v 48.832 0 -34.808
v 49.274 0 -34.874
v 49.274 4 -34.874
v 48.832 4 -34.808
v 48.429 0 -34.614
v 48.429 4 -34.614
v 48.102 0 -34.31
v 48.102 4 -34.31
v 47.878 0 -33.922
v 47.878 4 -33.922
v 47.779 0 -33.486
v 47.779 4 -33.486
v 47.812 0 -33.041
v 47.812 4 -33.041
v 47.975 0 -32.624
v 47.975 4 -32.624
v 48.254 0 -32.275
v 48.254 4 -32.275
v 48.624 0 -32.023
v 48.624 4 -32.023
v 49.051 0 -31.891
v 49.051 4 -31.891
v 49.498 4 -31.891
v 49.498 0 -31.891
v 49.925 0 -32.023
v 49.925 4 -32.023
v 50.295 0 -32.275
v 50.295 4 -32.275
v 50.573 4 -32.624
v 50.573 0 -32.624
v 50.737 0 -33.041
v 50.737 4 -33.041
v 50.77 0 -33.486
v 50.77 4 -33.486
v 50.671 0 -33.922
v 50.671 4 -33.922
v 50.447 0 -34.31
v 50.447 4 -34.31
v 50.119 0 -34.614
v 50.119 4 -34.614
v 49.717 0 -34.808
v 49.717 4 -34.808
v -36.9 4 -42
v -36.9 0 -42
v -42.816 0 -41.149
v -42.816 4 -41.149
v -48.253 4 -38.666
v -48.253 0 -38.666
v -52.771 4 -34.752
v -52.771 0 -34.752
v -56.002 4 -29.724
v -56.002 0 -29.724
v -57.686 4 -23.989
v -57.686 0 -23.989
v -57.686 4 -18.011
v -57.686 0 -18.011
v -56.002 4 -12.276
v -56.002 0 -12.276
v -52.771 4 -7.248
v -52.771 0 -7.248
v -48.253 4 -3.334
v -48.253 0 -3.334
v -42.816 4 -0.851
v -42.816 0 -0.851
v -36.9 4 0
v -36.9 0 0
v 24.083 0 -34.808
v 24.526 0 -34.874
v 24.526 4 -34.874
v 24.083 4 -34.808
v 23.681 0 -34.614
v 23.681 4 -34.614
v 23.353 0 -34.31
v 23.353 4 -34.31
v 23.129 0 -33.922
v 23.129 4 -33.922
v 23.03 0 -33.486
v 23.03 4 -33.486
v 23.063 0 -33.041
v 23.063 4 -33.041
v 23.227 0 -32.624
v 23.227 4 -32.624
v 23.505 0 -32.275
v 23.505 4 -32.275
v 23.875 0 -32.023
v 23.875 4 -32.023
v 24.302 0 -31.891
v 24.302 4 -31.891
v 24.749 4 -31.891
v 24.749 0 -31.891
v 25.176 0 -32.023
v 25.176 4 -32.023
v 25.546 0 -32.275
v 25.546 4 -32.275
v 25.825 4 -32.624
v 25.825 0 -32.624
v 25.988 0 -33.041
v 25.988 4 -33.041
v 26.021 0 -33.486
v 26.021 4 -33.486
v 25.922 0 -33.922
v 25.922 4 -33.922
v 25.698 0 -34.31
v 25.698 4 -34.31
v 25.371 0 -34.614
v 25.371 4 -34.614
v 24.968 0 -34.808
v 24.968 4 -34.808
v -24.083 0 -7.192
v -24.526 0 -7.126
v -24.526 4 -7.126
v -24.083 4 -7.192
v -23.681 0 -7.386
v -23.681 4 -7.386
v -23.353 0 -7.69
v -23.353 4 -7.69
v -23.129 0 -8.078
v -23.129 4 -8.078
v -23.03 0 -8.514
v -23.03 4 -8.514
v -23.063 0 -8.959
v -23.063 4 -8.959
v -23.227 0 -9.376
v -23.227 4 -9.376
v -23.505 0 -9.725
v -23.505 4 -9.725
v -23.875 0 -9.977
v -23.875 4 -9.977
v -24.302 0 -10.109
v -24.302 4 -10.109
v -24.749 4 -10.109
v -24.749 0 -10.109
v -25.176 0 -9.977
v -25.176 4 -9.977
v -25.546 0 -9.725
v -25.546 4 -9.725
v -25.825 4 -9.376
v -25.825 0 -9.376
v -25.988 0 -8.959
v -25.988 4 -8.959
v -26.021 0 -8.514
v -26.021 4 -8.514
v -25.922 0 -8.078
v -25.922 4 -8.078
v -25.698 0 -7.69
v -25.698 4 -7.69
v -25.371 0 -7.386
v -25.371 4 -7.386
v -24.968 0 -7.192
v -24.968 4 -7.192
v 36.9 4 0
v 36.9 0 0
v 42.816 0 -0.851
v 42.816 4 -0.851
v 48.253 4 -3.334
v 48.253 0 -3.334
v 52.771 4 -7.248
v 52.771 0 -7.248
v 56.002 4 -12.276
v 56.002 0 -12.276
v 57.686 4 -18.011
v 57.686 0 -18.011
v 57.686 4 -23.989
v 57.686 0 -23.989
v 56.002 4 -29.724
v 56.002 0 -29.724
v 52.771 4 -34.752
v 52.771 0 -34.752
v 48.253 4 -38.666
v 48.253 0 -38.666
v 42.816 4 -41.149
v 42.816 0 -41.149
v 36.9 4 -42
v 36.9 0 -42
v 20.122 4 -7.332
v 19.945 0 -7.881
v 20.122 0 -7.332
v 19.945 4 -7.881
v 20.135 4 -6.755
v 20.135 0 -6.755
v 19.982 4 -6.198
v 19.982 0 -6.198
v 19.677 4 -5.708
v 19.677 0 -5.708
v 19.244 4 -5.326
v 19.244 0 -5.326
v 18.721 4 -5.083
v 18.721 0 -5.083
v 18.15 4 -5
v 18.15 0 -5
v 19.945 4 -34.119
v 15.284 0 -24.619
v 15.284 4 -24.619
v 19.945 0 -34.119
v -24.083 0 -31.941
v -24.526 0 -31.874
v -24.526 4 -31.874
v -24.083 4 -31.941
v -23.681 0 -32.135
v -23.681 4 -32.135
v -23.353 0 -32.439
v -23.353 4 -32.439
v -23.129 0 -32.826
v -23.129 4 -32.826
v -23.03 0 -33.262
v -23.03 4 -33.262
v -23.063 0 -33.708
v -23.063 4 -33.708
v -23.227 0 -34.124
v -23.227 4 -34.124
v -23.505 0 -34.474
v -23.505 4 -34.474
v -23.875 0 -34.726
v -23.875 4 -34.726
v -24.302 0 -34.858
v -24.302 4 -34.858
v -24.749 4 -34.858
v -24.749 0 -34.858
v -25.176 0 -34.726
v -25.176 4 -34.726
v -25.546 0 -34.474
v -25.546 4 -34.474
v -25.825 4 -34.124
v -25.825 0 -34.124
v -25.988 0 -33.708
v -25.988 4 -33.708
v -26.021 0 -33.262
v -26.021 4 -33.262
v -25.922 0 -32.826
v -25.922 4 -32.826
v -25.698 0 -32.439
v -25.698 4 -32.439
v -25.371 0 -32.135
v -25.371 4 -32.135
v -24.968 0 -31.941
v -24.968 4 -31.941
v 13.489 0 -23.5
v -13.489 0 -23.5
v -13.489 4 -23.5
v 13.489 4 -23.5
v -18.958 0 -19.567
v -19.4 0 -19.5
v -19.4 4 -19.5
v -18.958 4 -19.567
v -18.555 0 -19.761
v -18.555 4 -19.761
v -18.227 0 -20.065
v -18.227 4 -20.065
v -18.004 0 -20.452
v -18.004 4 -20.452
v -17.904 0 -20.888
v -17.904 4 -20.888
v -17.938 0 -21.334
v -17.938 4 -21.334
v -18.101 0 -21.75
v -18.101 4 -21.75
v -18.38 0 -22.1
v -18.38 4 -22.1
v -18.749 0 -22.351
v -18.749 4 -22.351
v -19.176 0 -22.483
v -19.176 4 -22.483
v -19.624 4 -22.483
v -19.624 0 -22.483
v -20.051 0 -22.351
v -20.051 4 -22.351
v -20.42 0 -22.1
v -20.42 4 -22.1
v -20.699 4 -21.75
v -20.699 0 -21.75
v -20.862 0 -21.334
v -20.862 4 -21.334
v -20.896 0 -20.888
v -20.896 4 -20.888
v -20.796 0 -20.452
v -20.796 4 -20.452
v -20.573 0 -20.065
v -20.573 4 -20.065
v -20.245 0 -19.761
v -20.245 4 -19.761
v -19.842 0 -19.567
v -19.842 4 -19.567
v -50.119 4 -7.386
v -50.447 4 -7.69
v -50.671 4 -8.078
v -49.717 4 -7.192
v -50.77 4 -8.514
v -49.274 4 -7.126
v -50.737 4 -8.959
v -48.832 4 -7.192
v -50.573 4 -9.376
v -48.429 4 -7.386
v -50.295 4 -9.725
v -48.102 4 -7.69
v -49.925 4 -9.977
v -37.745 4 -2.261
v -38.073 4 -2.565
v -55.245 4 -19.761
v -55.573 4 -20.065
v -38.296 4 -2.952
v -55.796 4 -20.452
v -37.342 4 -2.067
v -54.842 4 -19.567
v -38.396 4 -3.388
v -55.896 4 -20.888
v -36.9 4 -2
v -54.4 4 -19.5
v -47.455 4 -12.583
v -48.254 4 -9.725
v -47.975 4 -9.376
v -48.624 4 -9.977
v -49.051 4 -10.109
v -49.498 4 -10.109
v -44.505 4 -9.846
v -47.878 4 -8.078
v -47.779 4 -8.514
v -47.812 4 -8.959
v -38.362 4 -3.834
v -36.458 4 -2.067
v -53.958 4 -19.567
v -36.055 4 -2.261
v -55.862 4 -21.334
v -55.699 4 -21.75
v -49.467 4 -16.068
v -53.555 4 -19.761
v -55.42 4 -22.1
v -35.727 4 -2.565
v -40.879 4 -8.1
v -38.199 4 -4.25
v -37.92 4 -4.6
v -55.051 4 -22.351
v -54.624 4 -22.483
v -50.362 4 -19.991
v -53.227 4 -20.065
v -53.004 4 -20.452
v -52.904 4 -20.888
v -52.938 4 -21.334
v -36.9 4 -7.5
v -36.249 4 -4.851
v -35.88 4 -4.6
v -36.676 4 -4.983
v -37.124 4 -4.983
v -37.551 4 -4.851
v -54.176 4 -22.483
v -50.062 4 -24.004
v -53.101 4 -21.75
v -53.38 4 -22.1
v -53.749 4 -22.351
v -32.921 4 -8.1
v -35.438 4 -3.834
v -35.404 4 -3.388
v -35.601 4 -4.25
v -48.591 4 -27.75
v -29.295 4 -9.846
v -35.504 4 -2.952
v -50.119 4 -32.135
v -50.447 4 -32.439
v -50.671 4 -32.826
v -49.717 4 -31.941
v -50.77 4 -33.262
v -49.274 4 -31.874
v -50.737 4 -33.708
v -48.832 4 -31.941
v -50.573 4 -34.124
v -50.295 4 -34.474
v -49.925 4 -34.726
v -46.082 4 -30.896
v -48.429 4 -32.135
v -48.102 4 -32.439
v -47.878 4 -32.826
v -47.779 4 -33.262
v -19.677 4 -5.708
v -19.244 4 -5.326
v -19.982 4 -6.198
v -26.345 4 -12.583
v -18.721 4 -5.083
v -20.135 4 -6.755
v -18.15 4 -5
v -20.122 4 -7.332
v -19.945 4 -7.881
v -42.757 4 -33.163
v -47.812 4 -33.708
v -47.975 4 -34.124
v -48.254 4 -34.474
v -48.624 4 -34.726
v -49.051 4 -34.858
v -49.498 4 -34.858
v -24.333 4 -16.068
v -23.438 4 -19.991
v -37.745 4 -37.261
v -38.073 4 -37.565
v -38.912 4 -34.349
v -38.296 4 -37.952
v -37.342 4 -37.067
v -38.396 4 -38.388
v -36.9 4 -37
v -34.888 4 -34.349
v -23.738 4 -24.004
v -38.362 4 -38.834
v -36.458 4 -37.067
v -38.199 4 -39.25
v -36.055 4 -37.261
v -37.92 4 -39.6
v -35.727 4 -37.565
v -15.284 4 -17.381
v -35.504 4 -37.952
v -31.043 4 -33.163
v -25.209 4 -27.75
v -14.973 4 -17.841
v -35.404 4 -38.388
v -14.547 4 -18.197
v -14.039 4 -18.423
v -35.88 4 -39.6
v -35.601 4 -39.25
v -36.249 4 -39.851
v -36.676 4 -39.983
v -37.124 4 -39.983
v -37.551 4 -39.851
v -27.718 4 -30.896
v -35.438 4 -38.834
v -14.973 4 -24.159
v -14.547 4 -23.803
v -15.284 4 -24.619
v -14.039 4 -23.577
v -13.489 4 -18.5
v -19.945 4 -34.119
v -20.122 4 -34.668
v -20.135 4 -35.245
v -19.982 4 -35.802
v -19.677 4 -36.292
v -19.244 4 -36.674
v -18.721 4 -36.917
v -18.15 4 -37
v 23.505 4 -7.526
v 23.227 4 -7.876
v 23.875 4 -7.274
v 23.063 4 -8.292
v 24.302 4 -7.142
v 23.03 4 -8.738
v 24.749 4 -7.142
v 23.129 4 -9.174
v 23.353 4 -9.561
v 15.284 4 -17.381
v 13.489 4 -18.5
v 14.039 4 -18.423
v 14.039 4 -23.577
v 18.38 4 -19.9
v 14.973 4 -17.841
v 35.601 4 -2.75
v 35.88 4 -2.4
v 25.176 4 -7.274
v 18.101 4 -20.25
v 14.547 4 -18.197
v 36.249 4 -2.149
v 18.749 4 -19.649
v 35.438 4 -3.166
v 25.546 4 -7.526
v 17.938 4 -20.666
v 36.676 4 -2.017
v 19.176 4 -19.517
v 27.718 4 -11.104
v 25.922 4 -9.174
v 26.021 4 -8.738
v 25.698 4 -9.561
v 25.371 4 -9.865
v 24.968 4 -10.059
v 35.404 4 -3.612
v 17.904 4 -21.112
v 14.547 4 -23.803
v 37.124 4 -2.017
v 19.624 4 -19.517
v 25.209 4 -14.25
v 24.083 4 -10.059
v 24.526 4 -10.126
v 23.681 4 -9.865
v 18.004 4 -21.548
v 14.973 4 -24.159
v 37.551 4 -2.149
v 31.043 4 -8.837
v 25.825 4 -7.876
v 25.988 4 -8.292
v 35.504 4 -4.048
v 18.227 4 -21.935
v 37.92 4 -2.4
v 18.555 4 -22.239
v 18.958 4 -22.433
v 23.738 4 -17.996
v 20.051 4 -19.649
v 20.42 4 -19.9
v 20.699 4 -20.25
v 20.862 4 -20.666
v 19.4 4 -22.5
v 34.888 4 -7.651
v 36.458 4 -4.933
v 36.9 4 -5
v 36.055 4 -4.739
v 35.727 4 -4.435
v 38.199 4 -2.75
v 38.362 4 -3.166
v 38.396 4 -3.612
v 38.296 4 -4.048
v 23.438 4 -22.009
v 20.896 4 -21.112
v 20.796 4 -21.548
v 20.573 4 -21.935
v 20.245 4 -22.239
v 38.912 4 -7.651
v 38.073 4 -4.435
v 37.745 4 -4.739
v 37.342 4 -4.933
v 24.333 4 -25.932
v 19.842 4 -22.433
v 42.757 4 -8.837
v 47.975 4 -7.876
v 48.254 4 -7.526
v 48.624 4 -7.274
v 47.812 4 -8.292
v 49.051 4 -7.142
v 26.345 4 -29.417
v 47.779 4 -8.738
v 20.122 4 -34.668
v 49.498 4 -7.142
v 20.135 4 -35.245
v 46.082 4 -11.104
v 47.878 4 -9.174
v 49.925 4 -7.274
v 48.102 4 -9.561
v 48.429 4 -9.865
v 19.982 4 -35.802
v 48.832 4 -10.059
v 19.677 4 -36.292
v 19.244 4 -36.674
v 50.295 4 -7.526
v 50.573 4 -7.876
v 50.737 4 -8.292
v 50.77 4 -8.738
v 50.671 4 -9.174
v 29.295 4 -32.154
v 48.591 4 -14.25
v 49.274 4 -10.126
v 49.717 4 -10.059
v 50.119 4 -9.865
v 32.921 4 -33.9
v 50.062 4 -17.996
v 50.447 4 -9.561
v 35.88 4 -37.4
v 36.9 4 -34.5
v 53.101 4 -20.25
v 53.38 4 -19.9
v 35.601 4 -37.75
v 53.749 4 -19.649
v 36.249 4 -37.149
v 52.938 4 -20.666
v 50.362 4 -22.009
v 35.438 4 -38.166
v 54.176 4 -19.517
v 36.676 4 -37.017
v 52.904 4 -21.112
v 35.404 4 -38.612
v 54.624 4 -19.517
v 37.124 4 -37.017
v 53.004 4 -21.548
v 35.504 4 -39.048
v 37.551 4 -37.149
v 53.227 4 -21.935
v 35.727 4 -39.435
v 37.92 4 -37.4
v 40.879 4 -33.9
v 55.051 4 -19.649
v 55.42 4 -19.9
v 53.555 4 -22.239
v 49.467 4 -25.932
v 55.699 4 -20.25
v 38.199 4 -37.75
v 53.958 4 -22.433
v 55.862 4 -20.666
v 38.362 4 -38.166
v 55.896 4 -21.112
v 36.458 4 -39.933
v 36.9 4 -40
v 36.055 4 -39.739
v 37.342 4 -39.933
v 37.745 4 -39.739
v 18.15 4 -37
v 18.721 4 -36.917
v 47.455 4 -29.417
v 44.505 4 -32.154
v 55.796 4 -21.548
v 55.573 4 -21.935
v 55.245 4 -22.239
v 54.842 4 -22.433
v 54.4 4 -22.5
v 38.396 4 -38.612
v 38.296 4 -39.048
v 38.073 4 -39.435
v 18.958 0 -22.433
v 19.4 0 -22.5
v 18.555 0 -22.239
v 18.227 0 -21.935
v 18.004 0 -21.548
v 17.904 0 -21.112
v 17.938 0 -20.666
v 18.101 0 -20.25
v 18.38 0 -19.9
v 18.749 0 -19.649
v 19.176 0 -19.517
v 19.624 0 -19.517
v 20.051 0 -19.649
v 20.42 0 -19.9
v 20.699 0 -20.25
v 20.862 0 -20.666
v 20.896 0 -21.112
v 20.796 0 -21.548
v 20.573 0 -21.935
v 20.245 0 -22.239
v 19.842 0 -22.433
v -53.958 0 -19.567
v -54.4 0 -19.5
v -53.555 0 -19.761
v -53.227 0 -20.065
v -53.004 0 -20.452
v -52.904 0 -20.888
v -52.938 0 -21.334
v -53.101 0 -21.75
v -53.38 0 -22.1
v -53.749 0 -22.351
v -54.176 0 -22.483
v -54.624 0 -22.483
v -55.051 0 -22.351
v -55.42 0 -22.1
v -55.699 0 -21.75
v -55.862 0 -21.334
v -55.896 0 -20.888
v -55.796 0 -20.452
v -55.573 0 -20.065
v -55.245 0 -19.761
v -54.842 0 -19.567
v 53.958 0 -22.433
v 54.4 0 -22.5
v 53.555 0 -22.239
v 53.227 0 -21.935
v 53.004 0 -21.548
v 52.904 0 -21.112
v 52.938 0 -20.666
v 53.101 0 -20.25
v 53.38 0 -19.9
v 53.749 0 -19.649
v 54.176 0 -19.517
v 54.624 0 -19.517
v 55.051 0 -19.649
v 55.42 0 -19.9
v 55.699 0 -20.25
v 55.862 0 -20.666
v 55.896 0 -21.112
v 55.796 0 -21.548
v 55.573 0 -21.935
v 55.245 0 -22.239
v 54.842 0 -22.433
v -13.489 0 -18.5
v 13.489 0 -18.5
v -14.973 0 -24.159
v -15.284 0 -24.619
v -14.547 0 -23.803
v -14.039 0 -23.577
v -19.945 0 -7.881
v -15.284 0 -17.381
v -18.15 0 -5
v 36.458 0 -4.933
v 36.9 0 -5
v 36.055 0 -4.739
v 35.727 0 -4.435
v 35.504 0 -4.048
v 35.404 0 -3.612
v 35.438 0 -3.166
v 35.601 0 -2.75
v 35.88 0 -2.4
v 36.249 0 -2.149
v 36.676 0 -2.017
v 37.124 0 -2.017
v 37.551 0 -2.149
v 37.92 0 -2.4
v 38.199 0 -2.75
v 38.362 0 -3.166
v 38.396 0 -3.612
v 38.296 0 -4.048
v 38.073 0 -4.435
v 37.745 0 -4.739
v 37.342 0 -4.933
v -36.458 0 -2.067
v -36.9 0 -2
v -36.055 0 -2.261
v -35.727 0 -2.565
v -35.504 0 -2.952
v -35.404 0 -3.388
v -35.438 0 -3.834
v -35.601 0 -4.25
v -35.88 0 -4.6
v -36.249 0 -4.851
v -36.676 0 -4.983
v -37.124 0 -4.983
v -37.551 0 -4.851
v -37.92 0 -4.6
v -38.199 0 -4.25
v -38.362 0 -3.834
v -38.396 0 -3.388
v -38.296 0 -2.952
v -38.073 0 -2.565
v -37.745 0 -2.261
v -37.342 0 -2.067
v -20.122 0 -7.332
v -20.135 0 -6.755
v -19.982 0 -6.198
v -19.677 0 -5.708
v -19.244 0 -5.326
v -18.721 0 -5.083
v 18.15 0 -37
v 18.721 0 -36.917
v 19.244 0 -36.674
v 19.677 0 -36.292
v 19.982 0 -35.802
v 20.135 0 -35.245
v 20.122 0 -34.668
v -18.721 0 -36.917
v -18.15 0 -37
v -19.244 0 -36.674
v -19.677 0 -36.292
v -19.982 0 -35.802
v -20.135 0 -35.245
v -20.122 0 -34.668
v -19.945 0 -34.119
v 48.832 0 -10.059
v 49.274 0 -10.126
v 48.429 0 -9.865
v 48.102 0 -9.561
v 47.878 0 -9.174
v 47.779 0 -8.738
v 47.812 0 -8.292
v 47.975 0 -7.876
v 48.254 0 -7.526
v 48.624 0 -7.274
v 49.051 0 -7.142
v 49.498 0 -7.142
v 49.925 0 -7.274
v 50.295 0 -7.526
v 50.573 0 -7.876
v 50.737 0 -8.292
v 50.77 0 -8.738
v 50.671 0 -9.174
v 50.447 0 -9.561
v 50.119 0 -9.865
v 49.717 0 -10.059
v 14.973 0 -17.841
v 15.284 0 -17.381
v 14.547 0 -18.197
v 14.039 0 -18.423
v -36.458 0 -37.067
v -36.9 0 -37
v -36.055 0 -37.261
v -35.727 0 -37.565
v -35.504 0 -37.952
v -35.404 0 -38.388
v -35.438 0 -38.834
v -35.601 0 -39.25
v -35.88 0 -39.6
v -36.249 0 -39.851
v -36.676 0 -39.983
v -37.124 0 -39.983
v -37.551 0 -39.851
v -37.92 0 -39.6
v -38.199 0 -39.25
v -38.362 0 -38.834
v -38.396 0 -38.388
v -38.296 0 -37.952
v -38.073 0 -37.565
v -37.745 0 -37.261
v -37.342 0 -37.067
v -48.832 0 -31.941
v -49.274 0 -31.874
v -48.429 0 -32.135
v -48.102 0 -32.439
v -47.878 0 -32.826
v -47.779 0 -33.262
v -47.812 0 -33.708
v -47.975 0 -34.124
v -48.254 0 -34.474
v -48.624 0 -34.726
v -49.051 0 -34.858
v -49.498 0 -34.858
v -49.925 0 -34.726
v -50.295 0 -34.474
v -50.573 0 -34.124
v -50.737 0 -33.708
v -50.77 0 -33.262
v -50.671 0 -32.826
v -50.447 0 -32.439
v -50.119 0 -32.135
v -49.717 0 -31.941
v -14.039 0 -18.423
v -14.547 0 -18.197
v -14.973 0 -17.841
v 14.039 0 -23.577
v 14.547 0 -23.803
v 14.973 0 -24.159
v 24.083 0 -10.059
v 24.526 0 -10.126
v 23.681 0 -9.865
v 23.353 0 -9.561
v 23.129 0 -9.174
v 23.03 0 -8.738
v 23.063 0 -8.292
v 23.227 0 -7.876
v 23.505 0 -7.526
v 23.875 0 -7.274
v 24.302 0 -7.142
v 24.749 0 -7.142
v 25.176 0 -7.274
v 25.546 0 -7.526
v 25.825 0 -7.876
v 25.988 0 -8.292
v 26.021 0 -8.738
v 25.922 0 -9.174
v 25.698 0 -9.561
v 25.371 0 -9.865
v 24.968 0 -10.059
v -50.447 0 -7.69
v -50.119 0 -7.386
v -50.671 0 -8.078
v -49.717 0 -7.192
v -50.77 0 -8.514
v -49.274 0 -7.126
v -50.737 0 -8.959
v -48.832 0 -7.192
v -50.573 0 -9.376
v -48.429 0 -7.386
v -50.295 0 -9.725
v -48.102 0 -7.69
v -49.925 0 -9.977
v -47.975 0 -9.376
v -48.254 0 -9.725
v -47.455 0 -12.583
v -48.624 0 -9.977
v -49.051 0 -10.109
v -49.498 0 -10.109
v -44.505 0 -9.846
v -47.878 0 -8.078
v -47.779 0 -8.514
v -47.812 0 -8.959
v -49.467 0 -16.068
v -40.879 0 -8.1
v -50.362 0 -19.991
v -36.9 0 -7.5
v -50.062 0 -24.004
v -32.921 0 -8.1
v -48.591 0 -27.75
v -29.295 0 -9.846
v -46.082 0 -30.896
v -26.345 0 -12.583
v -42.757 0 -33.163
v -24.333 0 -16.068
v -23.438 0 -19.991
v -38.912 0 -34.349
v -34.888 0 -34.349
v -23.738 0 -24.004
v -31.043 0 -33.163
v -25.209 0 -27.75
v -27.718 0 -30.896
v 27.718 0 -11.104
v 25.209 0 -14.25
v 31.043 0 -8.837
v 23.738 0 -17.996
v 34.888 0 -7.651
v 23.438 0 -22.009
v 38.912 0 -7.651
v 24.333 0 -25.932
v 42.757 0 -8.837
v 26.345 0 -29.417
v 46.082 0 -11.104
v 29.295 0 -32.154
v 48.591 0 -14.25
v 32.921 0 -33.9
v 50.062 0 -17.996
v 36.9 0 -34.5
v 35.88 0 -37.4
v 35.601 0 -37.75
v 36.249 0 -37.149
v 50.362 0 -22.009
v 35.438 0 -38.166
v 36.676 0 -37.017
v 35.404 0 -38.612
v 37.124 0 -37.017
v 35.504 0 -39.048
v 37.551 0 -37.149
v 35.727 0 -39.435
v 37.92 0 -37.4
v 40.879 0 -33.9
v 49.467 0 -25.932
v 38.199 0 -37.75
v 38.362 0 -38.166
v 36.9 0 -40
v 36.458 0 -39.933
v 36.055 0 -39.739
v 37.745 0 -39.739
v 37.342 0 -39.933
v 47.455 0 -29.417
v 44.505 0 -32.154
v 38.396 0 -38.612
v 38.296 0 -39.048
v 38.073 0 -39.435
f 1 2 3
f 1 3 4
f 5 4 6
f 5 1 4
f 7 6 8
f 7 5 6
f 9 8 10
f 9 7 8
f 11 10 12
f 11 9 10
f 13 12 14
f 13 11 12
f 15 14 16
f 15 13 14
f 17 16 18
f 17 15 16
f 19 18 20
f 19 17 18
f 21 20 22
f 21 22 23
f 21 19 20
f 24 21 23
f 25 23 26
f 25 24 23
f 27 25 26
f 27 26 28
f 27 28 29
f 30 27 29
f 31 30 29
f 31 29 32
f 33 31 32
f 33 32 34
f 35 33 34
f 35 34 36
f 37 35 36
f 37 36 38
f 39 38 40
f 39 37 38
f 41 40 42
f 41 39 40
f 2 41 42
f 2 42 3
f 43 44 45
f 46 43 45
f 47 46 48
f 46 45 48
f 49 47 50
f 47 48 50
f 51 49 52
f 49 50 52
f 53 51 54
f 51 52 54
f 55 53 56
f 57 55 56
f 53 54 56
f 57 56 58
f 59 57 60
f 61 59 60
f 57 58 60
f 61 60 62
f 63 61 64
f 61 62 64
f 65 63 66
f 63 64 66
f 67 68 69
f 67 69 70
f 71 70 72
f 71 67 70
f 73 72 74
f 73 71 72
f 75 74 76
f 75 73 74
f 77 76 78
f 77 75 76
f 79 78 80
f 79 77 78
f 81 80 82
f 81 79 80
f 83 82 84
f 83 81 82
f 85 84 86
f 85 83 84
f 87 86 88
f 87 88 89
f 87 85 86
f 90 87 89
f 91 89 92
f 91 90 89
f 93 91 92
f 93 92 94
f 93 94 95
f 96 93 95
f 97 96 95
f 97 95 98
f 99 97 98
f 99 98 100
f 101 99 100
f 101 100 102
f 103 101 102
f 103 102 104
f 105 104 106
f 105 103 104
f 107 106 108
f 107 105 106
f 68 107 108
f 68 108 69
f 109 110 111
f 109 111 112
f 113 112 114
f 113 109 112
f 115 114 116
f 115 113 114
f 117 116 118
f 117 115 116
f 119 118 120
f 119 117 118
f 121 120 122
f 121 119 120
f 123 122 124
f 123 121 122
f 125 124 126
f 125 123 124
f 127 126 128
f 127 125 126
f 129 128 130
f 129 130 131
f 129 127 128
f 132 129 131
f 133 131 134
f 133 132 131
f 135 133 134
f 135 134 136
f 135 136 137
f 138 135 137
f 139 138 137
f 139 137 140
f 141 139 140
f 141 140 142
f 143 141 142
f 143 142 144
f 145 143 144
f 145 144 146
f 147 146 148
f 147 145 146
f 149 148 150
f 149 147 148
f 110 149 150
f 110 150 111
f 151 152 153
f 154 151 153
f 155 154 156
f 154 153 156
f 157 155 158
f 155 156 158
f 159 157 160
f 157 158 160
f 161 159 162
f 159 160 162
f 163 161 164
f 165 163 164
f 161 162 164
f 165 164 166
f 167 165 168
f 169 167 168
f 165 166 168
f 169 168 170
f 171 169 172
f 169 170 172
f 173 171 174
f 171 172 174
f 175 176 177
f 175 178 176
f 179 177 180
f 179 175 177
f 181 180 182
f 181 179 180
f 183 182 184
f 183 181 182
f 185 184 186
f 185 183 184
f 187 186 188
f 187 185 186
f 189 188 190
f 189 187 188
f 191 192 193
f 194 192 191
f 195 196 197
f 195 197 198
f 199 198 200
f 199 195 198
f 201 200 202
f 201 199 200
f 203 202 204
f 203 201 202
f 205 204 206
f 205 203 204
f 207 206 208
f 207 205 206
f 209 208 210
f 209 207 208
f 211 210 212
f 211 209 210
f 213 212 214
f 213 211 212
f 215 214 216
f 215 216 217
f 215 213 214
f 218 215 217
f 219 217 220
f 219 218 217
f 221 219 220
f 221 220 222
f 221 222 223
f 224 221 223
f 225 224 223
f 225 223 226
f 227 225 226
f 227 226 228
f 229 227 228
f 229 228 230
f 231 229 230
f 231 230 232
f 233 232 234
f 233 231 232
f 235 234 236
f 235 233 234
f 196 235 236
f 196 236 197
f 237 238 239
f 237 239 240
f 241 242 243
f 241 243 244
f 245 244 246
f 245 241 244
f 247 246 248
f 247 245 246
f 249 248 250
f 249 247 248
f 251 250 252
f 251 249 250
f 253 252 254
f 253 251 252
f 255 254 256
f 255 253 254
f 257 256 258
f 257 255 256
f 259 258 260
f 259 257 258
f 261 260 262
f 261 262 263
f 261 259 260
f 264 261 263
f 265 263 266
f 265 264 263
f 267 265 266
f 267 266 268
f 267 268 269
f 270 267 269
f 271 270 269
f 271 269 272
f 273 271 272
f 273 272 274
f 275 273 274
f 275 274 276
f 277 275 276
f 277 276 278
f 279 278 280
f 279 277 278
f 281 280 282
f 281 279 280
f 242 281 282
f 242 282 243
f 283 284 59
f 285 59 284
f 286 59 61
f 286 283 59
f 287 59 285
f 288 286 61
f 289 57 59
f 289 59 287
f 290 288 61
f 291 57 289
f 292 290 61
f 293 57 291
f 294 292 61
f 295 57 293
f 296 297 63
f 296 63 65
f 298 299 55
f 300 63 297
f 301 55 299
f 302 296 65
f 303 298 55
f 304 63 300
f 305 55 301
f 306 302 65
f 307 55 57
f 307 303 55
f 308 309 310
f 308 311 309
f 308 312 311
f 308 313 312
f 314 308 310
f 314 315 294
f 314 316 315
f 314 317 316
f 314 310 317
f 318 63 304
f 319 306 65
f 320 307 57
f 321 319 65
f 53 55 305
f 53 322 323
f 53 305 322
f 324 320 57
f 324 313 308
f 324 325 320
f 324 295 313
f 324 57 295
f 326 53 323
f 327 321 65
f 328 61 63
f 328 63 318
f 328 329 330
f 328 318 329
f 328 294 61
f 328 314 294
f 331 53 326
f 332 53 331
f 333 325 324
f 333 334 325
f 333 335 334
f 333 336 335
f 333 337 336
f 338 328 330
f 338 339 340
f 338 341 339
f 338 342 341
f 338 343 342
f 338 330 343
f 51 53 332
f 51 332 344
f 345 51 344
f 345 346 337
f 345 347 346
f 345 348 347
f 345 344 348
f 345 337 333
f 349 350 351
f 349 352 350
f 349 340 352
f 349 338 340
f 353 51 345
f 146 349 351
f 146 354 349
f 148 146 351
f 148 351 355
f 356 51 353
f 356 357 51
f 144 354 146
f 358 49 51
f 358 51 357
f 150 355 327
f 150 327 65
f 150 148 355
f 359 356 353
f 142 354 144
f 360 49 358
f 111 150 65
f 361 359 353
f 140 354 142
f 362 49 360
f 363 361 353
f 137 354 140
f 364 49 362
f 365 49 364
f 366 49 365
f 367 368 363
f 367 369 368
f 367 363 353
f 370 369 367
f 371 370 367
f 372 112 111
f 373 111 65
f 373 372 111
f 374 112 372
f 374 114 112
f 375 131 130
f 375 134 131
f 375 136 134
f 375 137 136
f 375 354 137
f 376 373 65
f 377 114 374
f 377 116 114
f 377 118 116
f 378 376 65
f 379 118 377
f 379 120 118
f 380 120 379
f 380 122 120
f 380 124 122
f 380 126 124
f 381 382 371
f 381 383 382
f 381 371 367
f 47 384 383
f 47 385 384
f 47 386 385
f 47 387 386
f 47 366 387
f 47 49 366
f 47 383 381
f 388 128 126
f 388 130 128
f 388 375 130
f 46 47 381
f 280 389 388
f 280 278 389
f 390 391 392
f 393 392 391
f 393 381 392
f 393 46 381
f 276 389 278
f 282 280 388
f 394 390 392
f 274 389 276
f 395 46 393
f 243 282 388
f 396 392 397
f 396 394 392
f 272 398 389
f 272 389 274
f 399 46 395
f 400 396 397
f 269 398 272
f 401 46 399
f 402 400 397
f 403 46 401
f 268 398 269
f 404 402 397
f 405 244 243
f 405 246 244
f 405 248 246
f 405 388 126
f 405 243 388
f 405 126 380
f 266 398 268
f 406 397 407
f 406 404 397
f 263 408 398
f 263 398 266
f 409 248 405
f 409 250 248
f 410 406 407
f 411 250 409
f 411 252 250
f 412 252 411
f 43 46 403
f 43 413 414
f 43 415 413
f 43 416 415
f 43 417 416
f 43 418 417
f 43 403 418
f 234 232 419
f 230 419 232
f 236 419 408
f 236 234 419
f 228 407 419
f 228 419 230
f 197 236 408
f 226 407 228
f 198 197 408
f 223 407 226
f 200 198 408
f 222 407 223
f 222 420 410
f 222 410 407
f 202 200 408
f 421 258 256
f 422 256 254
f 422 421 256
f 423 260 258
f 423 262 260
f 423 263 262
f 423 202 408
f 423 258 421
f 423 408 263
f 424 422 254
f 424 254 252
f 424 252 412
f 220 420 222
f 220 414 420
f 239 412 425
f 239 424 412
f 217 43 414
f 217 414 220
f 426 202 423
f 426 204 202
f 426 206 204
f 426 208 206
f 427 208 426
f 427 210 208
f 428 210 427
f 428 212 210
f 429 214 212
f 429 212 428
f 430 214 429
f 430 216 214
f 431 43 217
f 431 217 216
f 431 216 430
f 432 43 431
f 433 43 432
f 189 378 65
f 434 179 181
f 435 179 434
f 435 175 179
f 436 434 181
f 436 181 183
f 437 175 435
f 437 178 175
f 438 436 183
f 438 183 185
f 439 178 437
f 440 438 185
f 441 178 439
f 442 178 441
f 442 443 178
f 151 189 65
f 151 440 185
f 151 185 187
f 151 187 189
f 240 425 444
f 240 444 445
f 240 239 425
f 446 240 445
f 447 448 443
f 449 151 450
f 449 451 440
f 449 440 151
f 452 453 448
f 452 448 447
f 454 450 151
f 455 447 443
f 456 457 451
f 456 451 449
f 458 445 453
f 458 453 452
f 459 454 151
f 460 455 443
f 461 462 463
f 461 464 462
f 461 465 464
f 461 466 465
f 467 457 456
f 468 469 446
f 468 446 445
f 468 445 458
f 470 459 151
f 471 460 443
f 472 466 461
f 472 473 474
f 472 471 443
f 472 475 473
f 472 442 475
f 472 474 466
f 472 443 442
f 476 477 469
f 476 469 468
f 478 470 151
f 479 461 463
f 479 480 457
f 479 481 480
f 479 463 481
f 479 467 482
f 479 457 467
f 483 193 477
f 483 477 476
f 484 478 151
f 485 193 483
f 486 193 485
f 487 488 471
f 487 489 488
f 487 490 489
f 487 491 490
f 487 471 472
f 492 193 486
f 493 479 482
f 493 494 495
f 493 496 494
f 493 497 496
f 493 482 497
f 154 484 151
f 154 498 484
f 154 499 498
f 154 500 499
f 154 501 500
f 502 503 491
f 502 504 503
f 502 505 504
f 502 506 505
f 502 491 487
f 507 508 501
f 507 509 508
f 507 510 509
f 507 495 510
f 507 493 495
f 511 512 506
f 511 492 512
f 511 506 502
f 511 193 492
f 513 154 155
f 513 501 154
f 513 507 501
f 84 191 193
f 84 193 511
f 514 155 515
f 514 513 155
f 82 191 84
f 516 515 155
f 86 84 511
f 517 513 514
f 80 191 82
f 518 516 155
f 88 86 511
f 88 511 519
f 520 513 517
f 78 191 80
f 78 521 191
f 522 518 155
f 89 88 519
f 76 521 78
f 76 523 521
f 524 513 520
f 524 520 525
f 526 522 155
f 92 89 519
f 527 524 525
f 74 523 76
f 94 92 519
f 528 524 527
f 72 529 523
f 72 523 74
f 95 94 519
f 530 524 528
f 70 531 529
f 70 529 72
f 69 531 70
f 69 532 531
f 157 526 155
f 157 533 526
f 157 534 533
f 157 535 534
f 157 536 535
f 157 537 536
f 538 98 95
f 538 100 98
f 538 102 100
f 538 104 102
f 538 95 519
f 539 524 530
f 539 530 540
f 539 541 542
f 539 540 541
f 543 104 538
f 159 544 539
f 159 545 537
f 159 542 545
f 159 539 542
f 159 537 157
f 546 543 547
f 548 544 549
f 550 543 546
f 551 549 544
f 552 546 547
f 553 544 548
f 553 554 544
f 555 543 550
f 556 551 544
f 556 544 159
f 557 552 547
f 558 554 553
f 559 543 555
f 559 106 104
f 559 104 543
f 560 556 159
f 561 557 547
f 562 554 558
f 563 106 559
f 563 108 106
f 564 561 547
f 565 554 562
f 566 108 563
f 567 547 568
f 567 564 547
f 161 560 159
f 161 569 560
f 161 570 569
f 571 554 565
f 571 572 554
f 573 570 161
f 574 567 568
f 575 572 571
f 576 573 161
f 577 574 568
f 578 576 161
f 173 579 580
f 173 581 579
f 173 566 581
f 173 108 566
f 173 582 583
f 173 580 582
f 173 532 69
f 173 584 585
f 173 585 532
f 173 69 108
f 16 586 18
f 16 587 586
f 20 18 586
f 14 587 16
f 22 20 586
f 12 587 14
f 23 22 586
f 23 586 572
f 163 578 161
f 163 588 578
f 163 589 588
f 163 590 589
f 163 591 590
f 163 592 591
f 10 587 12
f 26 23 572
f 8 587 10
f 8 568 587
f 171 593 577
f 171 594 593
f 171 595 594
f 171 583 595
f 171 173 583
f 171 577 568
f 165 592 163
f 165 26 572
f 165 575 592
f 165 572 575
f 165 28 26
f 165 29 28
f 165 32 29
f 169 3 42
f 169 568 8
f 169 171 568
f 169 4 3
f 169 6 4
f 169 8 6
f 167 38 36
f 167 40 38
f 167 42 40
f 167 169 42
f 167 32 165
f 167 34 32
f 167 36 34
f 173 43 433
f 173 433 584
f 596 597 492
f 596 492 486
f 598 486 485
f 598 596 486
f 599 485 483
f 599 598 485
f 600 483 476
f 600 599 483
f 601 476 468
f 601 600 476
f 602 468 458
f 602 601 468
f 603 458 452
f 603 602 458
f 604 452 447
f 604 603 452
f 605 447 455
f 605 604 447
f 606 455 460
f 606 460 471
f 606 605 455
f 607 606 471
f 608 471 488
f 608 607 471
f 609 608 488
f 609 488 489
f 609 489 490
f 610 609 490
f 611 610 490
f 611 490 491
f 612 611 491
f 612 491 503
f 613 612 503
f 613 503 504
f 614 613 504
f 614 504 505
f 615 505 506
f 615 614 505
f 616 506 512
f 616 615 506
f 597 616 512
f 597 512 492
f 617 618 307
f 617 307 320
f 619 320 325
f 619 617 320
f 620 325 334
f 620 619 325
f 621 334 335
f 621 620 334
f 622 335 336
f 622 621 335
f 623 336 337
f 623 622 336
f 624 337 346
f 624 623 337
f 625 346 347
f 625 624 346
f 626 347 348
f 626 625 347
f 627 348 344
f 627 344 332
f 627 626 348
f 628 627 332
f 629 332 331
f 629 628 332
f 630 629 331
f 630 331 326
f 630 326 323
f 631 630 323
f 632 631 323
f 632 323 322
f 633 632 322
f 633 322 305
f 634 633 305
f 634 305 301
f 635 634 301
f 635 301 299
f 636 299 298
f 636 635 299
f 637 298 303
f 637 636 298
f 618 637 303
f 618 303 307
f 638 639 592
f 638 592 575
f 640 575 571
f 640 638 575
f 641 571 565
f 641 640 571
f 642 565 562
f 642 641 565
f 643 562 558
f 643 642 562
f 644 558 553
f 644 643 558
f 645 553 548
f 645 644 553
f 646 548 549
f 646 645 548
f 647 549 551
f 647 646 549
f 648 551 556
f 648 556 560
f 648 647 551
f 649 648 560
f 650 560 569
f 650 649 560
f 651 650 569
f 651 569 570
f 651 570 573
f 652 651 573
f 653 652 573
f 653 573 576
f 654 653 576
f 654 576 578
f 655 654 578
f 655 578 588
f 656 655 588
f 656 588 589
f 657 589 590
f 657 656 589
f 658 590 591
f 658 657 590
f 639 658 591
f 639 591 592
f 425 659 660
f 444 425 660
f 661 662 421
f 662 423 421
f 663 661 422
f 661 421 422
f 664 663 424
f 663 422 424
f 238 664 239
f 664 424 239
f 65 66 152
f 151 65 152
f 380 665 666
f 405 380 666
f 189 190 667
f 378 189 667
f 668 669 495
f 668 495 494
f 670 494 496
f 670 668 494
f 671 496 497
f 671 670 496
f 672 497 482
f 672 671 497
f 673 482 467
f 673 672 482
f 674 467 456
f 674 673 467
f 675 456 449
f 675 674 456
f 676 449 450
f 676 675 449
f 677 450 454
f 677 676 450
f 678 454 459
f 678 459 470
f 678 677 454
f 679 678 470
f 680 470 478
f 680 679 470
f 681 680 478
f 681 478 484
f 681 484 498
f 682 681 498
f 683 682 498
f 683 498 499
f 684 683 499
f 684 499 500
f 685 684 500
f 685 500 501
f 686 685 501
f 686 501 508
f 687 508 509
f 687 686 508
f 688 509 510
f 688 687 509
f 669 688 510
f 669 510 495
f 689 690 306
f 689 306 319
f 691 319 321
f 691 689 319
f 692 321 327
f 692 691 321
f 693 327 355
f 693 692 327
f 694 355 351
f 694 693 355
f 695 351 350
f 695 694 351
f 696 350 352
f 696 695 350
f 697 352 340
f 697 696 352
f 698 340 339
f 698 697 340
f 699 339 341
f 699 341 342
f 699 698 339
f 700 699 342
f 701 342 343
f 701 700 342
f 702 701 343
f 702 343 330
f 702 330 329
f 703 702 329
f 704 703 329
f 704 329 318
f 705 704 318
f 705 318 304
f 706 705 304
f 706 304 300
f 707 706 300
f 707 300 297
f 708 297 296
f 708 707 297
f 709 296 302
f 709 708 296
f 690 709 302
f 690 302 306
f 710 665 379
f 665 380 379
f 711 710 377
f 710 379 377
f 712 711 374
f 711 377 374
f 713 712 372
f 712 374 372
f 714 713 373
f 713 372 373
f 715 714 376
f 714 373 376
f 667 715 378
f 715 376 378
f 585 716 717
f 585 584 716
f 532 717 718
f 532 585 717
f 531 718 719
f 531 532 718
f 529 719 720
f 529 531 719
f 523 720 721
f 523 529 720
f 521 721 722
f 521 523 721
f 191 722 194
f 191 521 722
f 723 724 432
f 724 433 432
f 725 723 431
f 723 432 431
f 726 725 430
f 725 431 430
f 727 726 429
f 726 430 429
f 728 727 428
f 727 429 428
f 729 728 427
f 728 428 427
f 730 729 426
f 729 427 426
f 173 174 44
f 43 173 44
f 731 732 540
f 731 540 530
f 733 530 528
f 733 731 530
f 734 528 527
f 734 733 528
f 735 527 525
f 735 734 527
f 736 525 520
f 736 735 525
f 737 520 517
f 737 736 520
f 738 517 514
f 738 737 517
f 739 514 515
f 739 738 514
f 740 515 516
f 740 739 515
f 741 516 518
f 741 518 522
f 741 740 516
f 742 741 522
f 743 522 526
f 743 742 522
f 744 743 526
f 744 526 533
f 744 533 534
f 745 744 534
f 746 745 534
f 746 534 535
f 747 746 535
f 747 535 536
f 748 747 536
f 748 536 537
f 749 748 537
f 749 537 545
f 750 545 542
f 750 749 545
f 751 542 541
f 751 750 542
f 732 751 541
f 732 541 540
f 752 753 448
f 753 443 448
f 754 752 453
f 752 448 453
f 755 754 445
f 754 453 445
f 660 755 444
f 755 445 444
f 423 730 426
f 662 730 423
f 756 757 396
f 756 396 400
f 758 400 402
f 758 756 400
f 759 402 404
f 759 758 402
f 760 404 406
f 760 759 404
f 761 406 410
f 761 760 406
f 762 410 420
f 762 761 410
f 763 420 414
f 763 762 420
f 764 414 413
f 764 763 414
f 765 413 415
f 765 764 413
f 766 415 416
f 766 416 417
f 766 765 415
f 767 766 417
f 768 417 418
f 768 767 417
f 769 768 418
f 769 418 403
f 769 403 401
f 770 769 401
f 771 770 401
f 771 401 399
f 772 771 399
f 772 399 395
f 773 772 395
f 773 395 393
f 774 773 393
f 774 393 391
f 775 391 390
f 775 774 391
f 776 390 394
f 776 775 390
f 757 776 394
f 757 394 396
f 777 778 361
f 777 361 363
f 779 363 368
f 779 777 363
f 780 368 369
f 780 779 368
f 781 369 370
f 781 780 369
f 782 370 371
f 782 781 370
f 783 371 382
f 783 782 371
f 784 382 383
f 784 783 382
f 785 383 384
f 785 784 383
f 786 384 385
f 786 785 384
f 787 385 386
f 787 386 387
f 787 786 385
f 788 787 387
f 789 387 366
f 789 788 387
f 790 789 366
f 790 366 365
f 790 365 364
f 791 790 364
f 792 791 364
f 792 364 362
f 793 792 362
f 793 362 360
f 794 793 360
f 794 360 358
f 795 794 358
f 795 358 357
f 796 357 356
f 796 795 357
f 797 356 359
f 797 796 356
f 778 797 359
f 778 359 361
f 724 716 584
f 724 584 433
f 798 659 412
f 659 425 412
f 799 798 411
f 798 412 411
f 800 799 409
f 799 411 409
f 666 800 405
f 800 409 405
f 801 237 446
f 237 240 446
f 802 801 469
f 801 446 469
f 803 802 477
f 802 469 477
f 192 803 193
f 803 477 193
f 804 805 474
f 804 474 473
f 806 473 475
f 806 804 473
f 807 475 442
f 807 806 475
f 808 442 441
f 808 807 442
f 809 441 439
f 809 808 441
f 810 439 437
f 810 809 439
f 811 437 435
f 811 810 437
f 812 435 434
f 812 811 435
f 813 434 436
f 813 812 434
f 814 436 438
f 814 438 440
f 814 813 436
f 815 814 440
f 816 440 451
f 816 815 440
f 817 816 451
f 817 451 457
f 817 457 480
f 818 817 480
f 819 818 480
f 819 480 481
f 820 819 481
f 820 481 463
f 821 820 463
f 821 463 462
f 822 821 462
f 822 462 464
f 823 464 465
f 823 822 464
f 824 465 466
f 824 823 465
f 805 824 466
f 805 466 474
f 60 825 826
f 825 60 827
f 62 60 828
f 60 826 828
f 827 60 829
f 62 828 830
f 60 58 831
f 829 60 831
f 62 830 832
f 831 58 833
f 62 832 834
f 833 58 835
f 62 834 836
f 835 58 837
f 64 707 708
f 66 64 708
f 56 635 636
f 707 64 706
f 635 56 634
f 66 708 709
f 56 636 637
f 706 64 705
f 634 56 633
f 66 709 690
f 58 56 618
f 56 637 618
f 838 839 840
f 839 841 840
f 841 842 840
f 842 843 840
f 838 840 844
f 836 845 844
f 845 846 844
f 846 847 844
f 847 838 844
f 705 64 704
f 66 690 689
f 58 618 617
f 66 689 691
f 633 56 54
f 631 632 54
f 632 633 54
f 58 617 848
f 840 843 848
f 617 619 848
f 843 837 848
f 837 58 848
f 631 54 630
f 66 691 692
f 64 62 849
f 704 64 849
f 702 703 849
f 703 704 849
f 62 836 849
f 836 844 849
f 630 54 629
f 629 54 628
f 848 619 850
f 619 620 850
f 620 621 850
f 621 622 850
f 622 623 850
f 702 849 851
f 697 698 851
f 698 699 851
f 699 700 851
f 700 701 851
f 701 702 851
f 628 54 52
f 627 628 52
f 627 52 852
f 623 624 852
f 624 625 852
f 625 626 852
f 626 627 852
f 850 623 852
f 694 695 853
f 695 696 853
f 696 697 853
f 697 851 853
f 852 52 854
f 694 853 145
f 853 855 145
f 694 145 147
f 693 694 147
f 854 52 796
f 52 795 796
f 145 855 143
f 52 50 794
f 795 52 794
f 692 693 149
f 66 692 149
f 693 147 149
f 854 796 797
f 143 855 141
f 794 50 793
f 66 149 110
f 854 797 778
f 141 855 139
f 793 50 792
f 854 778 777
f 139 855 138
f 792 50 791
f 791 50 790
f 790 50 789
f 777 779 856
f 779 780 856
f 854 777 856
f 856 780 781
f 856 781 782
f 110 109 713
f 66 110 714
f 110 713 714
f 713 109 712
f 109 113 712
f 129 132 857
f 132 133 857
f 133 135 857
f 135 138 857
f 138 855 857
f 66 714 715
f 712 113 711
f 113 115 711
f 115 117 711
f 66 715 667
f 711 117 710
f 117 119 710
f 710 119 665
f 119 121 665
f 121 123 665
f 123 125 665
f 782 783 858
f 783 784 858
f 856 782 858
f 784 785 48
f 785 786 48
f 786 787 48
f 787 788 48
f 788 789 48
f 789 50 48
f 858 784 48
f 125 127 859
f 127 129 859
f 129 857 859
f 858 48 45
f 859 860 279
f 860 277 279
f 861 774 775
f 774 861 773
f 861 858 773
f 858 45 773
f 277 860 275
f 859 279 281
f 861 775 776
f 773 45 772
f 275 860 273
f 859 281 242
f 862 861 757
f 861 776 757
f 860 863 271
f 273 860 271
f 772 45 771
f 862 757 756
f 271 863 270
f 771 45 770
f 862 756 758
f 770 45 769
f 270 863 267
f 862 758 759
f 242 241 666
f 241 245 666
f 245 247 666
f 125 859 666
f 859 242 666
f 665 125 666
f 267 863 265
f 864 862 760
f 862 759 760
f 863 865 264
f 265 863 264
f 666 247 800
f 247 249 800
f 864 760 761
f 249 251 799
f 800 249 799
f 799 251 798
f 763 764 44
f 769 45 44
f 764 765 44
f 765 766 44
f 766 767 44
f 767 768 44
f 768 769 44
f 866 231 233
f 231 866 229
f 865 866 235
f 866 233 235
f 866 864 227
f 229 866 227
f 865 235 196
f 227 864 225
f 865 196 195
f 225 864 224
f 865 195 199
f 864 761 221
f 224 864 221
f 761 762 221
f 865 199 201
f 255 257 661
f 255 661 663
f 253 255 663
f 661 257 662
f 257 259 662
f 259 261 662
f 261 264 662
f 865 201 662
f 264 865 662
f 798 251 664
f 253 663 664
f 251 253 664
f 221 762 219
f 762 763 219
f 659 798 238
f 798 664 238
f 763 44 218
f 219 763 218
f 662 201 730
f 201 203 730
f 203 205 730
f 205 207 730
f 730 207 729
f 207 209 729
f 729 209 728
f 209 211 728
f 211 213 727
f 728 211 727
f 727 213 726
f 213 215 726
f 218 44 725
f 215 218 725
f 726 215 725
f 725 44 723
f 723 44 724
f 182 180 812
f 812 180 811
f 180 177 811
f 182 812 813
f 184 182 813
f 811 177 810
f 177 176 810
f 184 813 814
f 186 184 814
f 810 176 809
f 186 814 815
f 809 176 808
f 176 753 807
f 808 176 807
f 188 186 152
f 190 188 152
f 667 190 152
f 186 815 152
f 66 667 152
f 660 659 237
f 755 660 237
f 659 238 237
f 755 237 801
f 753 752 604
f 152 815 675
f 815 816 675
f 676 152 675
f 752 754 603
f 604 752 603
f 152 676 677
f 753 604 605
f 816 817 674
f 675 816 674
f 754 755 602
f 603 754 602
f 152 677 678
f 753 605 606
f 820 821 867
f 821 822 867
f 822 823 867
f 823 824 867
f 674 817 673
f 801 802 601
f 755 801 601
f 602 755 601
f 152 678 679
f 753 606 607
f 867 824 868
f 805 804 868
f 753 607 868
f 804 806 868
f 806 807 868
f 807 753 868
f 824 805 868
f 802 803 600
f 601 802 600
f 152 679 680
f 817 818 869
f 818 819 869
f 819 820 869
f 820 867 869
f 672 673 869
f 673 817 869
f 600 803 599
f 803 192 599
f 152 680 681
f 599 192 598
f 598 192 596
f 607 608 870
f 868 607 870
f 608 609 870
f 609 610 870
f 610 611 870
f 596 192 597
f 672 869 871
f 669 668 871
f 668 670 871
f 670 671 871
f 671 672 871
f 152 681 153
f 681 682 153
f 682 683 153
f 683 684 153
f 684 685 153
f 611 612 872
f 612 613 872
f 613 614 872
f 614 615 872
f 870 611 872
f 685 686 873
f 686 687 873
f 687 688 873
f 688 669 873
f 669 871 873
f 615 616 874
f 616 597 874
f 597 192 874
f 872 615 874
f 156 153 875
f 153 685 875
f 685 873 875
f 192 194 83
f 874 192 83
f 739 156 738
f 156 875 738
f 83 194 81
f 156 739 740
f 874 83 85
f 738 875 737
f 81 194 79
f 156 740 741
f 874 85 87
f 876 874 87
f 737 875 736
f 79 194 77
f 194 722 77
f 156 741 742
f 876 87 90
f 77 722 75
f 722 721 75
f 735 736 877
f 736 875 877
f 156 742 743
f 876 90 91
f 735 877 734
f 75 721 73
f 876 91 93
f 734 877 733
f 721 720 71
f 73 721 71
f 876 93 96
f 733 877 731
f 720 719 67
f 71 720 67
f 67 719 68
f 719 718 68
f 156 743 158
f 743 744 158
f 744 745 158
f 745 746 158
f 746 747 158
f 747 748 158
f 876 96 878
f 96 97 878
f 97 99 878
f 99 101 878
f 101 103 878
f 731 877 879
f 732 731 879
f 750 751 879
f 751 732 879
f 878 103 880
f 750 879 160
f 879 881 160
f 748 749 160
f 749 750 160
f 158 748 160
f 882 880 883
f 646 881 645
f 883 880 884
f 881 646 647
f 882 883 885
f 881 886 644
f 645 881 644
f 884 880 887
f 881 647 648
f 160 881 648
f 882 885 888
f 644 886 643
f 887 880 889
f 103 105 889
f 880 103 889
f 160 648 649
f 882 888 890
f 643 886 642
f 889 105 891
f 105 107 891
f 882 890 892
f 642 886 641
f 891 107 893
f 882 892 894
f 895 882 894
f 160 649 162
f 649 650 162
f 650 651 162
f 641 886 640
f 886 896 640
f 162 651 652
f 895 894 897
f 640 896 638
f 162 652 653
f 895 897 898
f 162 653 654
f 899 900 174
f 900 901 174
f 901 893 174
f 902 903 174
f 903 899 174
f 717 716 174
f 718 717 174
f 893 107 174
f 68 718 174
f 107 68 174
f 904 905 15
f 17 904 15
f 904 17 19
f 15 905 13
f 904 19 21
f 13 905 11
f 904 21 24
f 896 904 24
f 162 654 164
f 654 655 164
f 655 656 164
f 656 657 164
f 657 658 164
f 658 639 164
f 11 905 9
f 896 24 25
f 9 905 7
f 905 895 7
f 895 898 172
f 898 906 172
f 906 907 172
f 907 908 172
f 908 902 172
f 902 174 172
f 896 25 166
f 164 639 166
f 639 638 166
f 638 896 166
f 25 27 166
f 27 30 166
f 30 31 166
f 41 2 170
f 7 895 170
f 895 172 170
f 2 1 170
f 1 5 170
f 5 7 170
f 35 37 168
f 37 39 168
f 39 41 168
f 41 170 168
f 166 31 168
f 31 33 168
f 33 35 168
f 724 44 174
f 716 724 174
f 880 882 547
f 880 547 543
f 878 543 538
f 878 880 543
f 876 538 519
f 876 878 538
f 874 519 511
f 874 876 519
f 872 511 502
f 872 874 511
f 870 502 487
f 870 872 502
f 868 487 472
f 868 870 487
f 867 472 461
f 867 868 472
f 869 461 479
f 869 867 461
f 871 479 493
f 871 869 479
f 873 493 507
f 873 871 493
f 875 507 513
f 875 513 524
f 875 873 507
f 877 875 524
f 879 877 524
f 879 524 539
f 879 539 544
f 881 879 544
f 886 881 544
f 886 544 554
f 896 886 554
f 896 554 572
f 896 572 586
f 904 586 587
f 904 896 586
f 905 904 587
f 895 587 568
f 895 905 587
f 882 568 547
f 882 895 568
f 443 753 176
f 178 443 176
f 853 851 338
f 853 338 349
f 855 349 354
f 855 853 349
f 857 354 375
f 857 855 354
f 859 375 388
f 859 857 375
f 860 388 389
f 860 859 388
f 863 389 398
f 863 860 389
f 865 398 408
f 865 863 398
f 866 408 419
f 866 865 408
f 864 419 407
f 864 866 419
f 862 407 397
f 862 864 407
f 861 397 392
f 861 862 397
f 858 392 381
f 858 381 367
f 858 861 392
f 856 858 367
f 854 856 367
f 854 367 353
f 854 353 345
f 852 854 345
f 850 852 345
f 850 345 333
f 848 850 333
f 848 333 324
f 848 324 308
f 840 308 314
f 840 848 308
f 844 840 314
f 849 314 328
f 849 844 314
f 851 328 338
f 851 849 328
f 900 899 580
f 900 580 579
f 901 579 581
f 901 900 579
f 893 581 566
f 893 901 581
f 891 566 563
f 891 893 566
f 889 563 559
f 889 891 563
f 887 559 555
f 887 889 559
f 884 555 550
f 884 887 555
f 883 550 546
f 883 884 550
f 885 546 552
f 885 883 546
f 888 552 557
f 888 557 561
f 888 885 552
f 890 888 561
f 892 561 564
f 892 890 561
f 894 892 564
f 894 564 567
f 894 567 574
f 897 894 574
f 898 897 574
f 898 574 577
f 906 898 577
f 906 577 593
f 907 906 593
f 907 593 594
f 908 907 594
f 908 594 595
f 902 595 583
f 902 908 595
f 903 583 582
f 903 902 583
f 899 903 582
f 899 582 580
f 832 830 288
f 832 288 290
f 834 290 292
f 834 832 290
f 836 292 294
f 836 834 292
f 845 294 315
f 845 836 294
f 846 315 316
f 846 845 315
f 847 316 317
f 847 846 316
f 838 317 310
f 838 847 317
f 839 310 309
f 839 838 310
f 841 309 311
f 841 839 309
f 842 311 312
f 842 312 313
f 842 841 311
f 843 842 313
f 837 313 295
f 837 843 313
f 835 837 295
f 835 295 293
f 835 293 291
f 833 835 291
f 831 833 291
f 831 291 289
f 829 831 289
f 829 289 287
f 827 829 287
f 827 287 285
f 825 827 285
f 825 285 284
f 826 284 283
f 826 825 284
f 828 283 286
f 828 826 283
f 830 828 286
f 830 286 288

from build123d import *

# Parameters (mm, degrees)
SKETCH_1_R          = 13.5
SKETCH_1_R_2        = 1.5
EXTRUDE_1_DEPTH     = 4
CUT_EXTRUDE_2_DEPTH = 72.640840308
FILLET_1_R          = 2


with BuildPart() as part:
    # 草图1 → 凸台-拉伸1 (new body)
    with BuildSketch(Plane(origin=(0, 0, 0), x_dir=(1, 0, 0), z_dir=(0, 1, 0))):
        with BuildLine():
            Line((36.9, 42), (-36.9, 42))
            ThreePointArc((-36.9, 42), (-57.9, 21), (-36.9, 0))
            Line((-36.9, 0), (36.9, 0))
            ThreePointArc((36.9, 0), (57.9, 21), (36.9, 42))
        make_face()
        with Locations(Location((-36.9, 21, 0), (0, 0, 270))):
            Circle(SKETCH_1_R, mode=Mode.SUBTRACT)
        with Locations(Location((-36.9, 38.5, 0), (0, 0, 270))):
            Circle(SKETCH_1_R_2, mode=Mode.SUBTRACT)
        with Locations(Location((-24.525631329, 33.374368671, 0), (0, 0, 270))):
            Circle(SKETCH_1_R_2, mode=Mode.SUBTRACT)
        with Locations(Location((-19.4, 21, 0), (0, 0, 270))):
            Circle(SKETCH_1_R_2, mode=Mode.SUBTRACT)
        with Locations(Location((-24.525631329, 8.625631329, 0), (0, 0, 270))):
            Circle(SKETCH_1_R_2, mode=Mode.SUBTRACT)
        with Locations(Location((-36.9, 3.5, 0), (0, 0, 270))):
            Circle(SKETCH_1_R_2, mode=Mode.SUBTRACT)
        with Locations(Location((-49.274368671, 8.625631329, 0), (0, 0, 270))):
            Circle(SKETCH_1_R_2, mode=Mode.SUBTRACT)
        with Locations(Location((-54.4, 21, 0), (0, 0, 270))):
            Circle(SKETCH_1_R_2, mode=Mode.SUBTRACT)
        with Locations(Location((-49.274368671, 33.374368671, 0), (0, 0, 270))):
            Circle(SKETCH_1_R_2, mode=Mode.SUBTRACT)
        with Locations(Location((49.274368671, 33.374368671, 0), (0, 0, 90))):
            Circle(SKETCH_1_R_2, mode=Mode.SUBTRACT)
        with Locations(Location((54.4, 21, 0), (0, 0, 90))):
            Circle(SKETCH_1_R_2, mode=Mode.SUBTRACT)
        with Locations(Location((49.274368671, 8.625631329, 0), (0, 0, 90))):
            Circle(SKETCH_1_R_2, mode=Mode.SUBTRACT)
        with Locations(Location((36.9, 3.5, 0), (0, 0, 90))):
            Circle(SKETCH_1_R_2, mode=Mode.SUBTRACT)
        with Locations(Location((24.525631329, 8.625631329, 0), (0, 0, 90))):
            Circle(SKETCH_1_R_2, mode=Mode.SUBTRACT)
        with Locations(Location((19.4, 21, 0), (0, 0, 90))):
            Circle(SKETCH_1_R_2, mode=Mode.SUBTRACT)
        with Locations(Location((24.525631329, 33.374368671, 0), (0, 0, 90))):
            Circle(SKETCH_1_R_2, mode=Mode.SUBTRACT)
        with Locations(Location((36.9, 38.5, 0), (0, 0, 90))):
            Circle(SKETCH_1_R_2, mode=Mode.SUBTRACT)
        with Locations(Location((36.9, 21, 0), (0, 0, 90))):
            Circle(SKETCH_1_R, mode=Mode.SUBTRACT)
    extrude(amount=EXTRUDE_1_DEPTH)

    # 草图2 → 切除-拉伸2 (cut, through all)
    with BuildSketch(Plane(origin=(0, 0, 0), x_dir=(1, 0, 0), z_dir=(0, 1, 0))):
        Polygon((21.358748179, 37), (-21.358748179, 37), (-14.735151519, 23.5), (14.735151519, 23.5), align=None)
        Polygon((21.358748179, 5), (-21.358748179, 5), (-14.735151519, 18.5), (14.735151519, 18.5), align=None)
    extrude(amount=CUT_EXTRUDE_2_DEPTH, mode=Mode.SUBTRACT)

    # 圆角1
    fillet_1_edges = [part.edges().sort_by_distance(p)[0] for p in [
        (-21.358748179, 2, -37),
        (-14.735151519, 2, -23.5),
        (14.735151519, 2, -23.5),
        (21.358748179, 2, -37),
        (21.358748179, 2, -5),
        (14.735151519, 2, -18.5),
        (-14.735151519, 2, -18.5),
        (-21.358748179, 2, -5),
    ]]
    fillet(fillet_1_edges, radius=FILLET_1_R)


solid = part.part
